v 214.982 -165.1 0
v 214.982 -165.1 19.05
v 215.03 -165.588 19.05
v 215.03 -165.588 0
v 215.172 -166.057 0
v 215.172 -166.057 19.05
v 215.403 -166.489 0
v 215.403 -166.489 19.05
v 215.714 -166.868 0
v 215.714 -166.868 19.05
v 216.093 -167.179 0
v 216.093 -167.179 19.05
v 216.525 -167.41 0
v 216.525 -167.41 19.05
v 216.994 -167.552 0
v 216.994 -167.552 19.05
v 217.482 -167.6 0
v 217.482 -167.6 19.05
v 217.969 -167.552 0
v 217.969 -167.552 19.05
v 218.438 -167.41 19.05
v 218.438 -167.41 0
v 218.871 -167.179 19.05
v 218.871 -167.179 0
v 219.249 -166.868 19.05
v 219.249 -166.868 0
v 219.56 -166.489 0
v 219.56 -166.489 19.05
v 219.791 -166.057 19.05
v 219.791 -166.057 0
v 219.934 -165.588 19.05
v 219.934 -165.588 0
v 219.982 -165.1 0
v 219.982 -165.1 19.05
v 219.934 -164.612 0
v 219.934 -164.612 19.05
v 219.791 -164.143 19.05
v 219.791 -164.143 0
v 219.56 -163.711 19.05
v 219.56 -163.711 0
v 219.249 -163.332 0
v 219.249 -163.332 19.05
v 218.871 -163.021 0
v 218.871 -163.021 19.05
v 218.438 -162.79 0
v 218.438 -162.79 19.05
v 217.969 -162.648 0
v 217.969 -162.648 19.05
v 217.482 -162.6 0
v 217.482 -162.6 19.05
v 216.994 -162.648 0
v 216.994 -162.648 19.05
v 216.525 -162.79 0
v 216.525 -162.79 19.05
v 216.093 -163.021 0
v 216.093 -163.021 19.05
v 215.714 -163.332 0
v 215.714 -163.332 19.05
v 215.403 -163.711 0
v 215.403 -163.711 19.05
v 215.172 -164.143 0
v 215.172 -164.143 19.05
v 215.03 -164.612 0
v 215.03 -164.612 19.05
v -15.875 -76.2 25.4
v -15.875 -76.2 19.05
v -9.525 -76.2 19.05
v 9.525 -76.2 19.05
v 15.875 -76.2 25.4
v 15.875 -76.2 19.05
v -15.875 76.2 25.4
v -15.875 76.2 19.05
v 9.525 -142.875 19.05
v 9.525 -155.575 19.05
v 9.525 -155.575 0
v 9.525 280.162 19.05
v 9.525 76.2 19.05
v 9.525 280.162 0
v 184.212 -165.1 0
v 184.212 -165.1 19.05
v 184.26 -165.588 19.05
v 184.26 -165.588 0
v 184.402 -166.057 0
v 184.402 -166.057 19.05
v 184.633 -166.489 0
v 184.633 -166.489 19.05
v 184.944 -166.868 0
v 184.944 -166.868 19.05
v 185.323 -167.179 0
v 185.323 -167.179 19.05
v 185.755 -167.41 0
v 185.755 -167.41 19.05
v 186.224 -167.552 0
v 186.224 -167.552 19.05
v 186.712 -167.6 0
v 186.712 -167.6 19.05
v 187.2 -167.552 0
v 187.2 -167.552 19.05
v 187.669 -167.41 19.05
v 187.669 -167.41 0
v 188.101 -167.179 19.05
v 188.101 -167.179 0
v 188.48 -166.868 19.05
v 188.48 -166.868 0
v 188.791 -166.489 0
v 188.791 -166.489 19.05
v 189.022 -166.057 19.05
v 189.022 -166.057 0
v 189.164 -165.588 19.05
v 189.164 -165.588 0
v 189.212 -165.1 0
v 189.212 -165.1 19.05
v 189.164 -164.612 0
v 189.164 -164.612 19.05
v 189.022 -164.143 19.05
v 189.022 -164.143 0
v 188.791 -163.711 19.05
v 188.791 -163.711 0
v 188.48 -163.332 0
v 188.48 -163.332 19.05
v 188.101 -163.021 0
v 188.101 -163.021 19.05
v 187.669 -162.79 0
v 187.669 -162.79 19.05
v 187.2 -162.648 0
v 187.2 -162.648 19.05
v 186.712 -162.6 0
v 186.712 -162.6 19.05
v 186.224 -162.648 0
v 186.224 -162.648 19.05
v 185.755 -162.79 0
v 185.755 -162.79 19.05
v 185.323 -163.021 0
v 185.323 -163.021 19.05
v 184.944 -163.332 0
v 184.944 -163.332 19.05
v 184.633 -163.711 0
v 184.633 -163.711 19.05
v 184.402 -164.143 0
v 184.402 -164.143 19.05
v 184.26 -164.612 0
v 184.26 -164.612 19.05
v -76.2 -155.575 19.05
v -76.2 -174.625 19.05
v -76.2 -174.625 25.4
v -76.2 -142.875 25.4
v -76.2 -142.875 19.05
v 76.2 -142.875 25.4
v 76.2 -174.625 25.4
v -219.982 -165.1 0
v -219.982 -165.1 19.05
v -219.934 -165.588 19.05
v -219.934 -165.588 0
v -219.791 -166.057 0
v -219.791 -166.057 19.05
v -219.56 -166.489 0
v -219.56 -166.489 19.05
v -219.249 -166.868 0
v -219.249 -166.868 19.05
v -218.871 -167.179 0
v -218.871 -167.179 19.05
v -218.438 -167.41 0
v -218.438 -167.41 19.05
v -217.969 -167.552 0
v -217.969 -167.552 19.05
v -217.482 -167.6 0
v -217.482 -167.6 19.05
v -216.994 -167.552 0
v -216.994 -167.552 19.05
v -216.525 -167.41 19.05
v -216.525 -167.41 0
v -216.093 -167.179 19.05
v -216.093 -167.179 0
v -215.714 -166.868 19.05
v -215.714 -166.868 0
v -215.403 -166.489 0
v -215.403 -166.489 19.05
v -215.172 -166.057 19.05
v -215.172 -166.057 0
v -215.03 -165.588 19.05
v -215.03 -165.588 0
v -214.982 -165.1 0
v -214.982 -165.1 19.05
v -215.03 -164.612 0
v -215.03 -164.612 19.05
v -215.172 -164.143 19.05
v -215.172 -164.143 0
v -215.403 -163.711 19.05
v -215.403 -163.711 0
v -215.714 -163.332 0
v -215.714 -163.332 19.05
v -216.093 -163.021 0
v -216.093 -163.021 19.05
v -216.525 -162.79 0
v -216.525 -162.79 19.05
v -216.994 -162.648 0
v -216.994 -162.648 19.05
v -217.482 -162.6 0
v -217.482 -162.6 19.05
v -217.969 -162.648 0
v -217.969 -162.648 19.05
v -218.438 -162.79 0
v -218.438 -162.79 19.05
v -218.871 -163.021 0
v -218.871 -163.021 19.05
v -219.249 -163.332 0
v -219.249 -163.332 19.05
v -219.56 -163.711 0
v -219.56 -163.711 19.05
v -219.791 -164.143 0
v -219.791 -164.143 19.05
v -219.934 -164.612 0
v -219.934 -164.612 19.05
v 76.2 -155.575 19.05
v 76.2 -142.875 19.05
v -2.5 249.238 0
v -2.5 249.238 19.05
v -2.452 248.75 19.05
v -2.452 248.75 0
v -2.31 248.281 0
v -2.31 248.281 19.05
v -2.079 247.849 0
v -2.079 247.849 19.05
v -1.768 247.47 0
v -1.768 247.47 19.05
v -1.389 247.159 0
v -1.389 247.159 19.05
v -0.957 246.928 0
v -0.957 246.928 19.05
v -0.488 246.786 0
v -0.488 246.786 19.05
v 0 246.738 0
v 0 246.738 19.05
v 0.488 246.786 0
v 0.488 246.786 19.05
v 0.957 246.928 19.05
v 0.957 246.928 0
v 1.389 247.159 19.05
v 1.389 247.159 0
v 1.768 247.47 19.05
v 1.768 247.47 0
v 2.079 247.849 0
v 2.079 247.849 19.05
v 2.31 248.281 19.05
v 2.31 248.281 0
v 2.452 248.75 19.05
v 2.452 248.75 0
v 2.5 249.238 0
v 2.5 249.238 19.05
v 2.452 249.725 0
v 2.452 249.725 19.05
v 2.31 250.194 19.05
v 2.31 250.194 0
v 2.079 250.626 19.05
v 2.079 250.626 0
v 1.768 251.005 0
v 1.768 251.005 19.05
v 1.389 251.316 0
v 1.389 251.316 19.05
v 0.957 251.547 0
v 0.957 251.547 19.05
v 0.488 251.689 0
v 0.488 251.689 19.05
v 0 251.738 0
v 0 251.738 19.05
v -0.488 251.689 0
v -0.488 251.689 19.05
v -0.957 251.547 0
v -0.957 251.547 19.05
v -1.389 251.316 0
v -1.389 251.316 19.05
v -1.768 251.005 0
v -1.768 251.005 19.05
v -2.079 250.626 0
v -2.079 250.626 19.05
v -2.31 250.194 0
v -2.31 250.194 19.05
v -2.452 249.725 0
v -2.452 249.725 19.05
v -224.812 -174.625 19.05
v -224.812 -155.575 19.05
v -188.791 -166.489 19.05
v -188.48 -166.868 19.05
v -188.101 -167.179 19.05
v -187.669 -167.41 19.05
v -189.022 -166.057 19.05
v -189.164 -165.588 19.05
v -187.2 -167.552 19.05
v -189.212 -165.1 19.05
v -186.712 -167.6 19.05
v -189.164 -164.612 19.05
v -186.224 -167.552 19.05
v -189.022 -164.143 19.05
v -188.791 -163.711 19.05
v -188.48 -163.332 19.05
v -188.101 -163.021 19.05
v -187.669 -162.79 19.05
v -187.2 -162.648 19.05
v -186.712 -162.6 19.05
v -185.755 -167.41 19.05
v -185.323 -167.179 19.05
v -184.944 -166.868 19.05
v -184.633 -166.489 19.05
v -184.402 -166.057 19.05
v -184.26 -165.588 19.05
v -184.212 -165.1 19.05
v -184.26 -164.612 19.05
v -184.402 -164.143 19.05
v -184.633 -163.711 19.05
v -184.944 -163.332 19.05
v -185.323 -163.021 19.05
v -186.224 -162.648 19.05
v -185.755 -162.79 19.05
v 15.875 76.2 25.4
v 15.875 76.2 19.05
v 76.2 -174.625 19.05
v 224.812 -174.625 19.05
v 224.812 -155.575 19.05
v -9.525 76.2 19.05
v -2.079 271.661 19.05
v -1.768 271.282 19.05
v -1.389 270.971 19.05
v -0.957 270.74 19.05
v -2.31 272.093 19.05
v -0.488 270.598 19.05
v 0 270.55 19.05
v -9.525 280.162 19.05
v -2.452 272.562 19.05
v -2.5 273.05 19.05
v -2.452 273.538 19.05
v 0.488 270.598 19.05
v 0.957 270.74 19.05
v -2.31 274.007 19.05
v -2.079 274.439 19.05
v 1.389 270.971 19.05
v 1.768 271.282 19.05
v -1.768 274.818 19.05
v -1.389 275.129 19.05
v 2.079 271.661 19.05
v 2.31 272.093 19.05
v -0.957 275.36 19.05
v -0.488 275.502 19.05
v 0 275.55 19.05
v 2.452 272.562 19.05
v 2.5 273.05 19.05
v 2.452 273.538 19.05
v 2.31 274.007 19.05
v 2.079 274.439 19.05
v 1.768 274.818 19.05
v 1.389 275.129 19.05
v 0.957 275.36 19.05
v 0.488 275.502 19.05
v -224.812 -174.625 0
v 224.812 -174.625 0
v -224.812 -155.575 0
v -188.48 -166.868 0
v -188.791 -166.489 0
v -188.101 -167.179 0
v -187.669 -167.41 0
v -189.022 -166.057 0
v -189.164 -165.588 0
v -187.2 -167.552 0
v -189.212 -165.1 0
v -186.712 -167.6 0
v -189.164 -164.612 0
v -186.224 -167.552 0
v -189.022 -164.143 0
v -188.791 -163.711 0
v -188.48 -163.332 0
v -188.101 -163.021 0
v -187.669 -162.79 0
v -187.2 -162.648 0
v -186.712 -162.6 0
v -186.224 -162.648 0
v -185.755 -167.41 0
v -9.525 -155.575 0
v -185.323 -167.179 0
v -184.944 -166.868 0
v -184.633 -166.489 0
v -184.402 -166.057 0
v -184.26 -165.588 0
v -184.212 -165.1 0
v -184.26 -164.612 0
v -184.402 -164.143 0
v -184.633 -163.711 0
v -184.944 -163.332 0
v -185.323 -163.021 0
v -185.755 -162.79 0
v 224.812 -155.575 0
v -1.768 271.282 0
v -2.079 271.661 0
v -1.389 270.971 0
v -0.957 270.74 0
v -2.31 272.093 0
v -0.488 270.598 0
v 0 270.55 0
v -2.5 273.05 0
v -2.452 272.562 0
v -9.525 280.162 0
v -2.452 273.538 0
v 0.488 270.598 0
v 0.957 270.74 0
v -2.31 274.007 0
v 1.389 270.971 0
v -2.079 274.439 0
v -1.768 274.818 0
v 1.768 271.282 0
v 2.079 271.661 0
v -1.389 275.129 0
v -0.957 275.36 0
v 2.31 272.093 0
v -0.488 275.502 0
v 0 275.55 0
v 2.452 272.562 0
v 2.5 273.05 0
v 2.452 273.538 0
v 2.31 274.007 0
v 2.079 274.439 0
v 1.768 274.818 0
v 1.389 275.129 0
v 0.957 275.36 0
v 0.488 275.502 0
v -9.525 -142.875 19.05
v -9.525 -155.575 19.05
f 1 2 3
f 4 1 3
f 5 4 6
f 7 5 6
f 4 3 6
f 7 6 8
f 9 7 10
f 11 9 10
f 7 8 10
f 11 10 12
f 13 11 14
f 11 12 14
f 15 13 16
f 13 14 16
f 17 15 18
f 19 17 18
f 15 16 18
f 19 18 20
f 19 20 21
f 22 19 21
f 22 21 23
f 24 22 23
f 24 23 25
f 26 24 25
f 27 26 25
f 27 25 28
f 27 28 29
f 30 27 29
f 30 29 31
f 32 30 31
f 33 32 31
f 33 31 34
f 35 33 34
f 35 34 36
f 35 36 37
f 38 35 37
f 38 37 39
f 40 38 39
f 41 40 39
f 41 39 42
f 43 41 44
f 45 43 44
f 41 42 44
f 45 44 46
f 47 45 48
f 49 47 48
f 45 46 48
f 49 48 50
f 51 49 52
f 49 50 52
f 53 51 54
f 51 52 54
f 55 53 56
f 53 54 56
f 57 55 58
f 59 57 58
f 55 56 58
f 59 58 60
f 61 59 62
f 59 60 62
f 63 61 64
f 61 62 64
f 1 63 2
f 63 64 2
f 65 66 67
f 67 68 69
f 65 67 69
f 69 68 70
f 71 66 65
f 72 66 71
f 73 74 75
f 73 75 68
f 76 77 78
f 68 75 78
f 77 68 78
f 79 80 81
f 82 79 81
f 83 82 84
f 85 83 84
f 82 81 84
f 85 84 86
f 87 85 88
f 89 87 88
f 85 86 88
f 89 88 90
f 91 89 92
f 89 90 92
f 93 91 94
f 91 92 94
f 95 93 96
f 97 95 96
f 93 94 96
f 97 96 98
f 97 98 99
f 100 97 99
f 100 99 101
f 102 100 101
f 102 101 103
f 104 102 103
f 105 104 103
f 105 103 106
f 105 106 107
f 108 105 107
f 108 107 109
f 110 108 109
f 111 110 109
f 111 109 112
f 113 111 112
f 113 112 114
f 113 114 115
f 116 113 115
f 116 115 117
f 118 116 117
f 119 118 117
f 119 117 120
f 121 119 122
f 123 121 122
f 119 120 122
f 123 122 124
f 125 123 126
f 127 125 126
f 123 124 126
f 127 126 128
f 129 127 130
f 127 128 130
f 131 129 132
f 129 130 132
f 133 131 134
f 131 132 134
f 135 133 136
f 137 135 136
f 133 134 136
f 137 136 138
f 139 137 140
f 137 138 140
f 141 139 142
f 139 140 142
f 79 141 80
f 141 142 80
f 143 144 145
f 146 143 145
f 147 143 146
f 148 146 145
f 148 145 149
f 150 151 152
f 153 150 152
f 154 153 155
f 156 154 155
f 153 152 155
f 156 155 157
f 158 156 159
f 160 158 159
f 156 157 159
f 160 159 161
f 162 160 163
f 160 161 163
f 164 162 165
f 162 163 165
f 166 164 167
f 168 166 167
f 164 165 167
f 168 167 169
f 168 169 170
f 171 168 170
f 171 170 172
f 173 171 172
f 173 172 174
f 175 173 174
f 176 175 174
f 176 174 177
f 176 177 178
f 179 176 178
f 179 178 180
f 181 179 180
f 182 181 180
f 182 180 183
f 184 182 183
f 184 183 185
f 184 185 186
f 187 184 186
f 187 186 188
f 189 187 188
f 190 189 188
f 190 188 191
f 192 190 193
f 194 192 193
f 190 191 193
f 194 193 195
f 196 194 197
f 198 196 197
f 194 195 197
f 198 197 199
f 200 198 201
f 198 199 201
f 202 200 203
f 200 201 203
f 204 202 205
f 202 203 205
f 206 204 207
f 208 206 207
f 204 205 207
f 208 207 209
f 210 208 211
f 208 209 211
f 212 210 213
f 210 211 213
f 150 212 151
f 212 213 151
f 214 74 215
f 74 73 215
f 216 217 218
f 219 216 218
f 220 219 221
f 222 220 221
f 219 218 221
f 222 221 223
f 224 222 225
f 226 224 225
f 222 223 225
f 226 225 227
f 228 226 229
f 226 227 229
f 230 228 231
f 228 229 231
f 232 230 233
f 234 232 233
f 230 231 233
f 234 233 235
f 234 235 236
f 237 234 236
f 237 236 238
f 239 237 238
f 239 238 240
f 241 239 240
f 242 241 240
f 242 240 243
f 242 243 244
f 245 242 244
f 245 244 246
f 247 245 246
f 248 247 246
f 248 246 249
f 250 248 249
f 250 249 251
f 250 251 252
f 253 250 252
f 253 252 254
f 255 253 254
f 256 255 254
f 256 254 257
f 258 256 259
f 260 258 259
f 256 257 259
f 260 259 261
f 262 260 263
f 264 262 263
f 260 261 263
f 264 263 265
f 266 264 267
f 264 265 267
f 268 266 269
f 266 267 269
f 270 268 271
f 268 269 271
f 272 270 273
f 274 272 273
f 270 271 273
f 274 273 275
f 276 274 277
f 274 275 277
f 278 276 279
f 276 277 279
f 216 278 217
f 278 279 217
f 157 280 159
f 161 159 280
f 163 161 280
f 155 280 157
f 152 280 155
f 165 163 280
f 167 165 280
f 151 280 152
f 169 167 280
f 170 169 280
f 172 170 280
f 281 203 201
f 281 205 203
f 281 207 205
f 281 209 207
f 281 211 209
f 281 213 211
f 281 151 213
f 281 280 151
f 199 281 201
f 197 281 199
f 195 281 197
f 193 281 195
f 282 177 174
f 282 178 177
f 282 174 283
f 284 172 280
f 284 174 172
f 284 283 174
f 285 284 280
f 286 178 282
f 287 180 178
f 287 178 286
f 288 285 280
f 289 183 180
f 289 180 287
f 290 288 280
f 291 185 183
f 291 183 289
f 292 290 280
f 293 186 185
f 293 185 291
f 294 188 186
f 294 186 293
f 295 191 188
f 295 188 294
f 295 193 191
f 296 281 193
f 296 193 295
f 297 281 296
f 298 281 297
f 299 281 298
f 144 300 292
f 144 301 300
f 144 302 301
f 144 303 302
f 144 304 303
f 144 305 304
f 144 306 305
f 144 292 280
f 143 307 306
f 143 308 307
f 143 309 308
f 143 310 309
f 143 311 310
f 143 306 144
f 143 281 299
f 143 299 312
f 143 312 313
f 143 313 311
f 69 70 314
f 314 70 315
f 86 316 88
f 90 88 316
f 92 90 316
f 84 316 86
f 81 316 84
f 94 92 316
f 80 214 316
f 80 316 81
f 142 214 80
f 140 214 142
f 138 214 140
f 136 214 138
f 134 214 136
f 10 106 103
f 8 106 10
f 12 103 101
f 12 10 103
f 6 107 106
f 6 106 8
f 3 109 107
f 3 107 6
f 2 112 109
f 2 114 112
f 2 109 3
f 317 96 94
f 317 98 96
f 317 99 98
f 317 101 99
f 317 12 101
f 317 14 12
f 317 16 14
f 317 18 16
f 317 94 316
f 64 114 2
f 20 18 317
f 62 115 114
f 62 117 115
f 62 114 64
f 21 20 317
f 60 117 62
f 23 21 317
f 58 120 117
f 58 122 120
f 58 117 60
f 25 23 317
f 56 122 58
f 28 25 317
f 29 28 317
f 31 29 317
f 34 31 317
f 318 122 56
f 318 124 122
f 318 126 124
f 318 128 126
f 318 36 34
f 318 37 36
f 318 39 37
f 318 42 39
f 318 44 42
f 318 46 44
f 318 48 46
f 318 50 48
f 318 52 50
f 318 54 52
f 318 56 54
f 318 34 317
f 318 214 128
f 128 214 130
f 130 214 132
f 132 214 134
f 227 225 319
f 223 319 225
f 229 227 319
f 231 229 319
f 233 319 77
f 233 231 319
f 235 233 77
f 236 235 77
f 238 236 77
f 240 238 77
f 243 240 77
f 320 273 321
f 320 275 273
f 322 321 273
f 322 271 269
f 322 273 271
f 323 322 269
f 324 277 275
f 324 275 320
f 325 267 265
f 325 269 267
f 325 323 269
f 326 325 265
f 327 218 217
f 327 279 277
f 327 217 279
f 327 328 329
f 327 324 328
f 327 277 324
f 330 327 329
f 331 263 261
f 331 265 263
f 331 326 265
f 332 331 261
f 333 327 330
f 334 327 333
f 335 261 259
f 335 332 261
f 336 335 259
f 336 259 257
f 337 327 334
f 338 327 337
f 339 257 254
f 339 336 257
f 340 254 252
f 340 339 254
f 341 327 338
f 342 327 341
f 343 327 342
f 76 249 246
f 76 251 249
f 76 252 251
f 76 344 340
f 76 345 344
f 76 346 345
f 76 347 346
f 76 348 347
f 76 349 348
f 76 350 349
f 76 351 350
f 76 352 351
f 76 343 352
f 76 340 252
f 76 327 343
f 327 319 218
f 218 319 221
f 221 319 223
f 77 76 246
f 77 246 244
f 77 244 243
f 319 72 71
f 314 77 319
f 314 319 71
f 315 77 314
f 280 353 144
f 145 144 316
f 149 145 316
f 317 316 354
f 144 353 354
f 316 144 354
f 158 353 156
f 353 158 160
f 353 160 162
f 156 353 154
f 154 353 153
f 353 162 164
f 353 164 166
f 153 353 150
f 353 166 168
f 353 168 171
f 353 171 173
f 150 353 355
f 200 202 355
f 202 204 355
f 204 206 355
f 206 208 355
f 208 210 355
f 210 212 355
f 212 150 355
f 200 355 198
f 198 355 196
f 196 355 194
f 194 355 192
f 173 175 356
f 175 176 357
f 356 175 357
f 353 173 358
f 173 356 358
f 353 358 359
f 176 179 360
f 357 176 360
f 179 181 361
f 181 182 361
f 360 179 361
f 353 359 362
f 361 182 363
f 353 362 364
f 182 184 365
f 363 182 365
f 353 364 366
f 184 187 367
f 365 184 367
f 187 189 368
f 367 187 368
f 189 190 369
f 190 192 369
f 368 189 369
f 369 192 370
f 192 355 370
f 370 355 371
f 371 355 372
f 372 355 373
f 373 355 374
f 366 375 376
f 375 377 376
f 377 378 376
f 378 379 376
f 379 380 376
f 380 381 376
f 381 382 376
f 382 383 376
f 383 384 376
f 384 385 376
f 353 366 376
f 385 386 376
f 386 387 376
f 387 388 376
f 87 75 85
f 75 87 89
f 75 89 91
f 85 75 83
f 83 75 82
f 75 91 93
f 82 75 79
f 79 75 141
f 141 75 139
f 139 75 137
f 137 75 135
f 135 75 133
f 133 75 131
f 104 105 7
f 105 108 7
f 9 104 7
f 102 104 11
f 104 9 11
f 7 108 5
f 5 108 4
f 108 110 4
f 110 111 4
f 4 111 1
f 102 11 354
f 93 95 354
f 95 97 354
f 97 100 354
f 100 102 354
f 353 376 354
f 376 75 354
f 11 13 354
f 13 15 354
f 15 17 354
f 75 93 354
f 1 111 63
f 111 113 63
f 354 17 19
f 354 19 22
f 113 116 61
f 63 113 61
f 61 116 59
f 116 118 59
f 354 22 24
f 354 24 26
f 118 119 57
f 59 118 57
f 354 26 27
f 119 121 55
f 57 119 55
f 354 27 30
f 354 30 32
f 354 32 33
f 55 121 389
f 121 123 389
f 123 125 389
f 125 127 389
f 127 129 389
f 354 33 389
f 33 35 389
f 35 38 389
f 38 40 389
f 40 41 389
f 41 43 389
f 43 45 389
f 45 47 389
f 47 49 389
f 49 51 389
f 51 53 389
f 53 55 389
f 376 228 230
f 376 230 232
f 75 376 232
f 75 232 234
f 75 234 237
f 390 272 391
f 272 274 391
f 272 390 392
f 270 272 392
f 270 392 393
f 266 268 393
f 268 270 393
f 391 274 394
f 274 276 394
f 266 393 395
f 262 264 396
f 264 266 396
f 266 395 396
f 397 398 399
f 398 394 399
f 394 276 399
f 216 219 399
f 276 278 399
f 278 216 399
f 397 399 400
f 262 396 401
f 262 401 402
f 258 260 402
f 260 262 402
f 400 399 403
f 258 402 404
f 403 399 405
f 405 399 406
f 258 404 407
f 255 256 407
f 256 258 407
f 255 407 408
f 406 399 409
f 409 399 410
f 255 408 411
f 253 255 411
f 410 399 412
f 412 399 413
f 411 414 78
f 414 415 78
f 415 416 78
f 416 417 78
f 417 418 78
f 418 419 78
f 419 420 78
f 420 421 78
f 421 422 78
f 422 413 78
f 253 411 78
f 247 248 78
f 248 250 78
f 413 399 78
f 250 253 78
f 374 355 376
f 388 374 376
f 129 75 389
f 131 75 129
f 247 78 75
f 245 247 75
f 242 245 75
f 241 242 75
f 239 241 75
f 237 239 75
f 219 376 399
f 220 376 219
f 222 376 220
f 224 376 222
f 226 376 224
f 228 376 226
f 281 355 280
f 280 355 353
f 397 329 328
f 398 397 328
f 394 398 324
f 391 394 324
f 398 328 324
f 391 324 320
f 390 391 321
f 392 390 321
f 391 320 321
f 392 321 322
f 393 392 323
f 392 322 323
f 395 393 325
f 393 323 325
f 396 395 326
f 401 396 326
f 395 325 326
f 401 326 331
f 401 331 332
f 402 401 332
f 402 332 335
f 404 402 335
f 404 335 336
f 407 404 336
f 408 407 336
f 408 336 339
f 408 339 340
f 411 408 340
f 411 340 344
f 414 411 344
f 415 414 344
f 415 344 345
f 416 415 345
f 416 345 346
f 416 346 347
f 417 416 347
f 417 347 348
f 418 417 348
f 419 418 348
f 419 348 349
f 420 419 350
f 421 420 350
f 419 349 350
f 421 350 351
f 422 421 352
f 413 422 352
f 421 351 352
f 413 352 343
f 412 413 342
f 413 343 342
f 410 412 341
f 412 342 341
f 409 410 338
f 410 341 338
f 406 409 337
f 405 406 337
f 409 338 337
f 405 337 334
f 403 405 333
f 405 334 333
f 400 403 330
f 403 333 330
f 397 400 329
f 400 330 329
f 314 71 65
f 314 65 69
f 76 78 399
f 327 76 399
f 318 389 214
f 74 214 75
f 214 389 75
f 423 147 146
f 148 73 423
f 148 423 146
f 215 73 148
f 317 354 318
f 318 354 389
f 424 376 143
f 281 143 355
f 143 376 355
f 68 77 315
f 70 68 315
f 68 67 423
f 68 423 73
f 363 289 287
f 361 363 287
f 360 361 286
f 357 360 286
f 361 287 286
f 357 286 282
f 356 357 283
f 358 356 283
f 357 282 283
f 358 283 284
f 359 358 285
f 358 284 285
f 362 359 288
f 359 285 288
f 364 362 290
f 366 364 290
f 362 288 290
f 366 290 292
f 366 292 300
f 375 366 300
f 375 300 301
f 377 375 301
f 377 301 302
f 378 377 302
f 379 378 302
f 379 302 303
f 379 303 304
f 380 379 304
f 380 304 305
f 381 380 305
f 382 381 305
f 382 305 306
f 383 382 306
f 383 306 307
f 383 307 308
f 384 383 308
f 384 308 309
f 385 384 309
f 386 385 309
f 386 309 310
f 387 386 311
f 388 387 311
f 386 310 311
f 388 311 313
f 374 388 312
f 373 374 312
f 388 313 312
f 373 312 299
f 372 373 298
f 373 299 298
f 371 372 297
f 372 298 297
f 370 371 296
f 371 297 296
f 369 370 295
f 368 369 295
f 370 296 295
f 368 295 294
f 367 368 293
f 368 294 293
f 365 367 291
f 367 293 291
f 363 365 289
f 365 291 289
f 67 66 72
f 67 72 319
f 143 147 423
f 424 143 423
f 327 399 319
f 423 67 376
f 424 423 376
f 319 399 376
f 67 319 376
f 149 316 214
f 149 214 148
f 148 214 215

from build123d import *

# Parameters (mm, degrees)
F1_DEPTH = 19.05
F2_W     = 152.4
F2_H     = 31.75
F2_W_2   = 31.75
F2_H_2   = 152.4
F3_DEPTH = 6.35
F4_D     = 5


with BuildPart() as f1:
    # F0 (on Top) → F1 (new body)
    with BuildSketch(Plane.XY):
        Polygon((-9.525, -155.575), (-224.8118673418, -155.575), (-224.8118673418, -174.625), (224.8118673418, -174.625), (224.8118673418, -155.575), (9.525, -155.575), (9.525, 280.162), (-9.525, 280.162), align=None)
    extrude(amount=F1_DEPTH)

    # F2 (on face) → F3 (join)
    with BuildSketch(Plane.XY.offset(19.05)):
        with Locations((0, -158.75)):
            Rectangle(F2_W, F2_H)
        Rectangle(F2_W_2, F2_H_2)
    extrude(amount=F3_DEPTH)

    # F4 (through all)
    with Locations(Plane(origin=(0, 0, 0), x_dir=(1, 0, 0), z_dir=(0, 0, -1))):
        with Locations((186.7118673418, 165.1), (0, -249.2375), (-186.7118673418, 165.1), (-217.4817061272, 165.1), (217.4817061272, 165.1), (0, -273.05)):
            Hole(F4_D / 2)


solid = f1.part
